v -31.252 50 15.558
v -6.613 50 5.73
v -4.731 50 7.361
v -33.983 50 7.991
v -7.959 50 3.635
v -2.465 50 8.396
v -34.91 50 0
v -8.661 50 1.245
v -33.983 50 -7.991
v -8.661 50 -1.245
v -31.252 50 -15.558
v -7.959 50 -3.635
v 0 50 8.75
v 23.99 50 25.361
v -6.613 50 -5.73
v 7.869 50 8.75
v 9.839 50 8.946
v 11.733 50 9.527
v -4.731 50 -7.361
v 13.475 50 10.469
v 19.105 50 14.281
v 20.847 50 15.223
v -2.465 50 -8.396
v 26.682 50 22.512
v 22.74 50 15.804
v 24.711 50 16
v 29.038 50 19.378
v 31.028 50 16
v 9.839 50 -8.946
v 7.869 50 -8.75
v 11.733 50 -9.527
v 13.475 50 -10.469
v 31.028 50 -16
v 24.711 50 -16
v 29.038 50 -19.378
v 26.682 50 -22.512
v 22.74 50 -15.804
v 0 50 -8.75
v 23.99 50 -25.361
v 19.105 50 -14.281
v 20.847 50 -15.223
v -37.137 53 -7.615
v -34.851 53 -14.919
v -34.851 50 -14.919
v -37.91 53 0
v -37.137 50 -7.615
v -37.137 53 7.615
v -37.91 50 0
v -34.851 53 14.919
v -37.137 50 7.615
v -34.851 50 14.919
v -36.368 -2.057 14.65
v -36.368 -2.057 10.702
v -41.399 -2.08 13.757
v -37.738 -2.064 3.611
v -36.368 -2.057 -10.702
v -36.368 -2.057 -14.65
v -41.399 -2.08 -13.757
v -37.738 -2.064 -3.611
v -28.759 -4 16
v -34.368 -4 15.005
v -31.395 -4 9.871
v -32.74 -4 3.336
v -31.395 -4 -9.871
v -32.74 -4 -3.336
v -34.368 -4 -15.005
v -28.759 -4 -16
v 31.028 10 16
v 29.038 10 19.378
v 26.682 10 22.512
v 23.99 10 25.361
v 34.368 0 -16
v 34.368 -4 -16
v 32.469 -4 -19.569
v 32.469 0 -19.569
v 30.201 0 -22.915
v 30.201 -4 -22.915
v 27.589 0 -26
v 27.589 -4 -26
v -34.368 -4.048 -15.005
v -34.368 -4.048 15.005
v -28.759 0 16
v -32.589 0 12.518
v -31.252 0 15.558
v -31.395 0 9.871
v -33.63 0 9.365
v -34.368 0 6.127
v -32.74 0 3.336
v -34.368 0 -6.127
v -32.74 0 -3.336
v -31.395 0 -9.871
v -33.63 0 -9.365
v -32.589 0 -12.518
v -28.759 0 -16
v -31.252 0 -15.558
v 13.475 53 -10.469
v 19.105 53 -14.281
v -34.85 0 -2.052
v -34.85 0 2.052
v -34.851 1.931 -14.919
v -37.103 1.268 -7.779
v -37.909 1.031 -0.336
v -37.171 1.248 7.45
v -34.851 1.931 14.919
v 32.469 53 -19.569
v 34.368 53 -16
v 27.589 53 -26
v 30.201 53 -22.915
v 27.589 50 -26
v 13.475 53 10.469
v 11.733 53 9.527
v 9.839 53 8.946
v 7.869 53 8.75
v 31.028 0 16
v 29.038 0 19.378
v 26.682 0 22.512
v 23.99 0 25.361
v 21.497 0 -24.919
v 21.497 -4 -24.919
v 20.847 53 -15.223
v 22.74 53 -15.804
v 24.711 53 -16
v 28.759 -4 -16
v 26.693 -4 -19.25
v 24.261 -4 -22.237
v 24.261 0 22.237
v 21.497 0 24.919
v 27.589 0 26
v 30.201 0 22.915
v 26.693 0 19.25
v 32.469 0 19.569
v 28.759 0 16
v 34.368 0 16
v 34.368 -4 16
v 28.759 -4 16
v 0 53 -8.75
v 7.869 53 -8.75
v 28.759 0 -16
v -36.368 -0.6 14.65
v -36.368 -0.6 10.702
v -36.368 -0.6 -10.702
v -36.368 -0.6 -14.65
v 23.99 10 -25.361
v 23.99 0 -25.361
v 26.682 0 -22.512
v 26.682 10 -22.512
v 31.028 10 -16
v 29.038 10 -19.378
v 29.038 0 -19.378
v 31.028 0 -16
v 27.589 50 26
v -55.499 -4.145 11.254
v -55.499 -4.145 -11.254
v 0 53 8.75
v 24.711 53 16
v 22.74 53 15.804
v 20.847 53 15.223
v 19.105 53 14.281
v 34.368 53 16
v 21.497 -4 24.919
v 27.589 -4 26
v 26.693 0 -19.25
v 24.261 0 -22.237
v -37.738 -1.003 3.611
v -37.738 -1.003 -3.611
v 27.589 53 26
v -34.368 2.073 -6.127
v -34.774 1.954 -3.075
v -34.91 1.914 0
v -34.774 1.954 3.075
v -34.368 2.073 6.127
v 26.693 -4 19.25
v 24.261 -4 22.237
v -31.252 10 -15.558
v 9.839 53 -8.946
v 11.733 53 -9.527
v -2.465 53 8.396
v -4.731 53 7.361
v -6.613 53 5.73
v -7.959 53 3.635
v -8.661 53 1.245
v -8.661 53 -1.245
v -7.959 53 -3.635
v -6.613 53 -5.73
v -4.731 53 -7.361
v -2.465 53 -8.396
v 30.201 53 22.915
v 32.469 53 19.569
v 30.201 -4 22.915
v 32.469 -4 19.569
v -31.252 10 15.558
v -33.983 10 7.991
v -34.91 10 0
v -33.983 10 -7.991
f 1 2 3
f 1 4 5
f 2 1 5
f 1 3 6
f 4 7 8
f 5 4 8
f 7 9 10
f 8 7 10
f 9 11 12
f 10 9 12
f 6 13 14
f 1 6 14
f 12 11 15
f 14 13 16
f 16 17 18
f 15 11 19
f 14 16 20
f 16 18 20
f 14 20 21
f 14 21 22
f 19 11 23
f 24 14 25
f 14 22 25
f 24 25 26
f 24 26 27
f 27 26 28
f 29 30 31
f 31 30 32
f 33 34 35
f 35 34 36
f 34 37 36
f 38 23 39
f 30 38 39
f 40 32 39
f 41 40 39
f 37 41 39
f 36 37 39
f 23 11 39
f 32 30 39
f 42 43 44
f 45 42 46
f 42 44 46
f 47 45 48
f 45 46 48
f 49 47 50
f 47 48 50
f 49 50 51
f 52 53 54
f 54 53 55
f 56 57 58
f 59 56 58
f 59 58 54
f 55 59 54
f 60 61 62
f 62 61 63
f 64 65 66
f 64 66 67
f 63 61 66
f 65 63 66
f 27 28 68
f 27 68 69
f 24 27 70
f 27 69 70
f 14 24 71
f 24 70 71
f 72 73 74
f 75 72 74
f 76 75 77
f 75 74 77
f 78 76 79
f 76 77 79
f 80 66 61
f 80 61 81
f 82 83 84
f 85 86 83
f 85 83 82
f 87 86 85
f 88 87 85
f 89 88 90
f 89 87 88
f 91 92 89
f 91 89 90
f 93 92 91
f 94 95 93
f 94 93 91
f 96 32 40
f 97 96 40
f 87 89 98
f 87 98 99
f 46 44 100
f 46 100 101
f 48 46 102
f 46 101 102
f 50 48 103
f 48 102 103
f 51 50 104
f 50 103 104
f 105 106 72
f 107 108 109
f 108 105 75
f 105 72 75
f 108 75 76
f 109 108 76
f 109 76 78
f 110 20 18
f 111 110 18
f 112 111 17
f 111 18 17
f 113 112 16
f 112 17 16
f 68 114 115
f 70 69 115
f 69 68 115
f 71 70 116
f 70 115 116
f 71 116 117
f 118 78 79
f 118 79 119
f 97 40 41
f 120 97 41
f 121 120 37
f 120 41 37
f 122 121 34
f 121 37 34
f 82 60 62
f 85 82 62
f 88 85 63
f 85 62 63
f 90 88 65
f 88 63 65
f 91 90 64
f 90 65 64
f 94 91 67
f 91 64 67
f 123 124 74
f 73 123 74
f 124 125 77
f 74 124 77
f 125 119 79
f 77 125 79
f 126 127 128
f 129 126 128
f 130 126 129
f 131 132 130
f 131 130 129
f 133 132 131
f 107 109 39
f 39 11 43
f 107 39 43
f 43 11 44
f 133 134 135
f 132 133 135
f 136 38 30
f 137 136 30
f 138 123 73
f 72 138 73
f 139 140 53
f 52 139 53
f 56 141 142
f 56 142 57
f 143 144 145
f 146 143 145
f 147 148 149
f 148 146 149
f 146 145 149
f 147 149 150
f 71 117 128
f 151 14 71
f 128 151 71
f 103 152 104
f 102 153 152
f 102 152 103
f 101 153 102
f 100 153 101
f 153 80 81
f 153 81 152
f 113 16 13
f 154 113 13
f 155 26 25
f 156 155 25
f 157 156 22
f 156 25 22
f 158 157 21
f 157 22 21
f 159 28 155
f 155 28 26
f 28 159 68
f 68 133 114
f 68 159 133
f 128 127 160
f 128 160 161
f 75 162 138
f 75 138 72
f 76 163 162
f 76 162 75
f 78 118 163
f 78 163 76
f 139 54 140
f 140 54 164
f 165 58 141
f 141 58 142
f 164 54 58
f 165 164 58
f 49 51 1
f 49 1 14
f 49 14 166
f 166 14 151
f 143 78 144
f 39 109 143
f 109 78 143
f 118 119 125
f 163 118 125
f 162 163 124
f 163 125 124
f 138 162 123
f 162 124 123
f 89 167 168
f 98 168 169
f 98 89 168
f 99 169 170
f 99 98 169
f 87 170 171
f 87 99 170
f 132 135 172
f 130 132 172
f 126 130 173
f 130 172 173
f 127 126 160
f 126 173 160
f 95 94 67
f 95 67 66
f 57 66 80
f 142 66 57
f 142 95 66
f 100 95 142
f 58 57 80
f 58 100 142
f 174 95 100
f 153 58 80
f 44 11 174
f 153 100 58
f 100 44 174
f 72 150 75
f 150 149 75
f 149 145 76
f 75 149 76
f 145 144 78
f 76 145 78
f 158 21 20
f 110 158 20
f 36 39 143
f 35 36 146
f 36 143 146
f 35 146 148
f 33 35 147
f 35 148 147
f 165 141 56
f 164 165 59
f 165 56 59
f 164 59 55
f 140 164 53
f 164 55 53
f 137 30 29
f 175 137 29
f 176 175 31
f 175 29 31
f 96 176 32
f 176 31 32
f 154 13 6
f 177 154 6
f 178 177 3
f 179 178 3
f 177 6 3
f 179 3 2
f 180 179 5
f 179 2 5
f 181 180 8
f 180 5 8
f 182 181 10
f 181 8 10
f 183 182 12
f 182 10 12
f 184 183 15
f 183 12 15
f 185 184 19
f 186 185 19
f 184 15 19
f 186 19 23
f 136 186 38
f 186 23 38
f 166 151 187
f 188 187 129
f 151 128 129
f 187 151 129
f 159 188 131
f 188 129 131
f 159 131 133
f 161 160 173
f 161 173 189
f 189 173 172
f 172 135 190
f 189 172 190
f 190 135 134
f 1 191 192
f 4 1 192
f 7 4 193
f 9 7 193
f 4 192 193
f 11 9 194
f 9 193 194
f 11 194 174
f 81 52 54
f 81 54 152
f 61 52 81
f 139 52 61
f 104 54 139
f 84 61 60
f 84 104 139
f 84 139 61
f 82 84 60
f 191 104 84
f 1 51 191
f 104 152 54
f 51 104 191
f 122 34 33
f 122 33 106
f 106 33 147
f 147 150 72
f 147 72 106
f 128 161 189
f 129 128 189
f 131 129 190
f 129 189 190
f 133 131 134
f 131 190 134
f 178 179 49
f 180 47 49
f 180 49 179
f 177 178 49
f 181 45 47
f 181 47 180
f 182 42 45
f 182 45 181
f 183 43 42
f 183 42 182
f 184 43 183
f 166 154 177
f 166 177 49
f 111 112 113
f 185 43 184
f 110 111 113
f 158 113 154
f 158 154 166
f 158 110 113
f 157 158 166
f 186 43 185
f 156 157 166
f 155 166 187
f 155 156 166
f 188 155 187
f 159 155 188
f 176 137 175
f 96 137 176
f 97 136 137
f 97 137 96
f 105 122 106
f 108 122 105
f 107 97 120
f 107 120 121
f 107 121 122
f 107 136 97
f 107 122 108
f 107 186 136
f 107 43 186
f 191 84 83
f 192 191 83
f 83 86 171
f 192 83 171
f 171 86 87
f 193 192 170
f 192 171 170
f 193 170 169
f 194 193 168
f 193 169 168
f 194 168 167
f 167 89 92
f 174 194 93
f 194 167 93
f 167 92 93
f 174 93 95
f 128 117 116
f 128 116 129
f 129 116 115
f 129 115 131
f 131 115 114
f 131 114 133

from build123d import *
from build123d.topology import SkipClean

# Parameters (mm, degrees)
BOSS_EXTRUDE1_DEPTH   = 50
BOSS_EXTRUDE1_2_DEPTH = 50
BOSS_EXTRUDE1_3_DEPTH = 50
BOSS_EXTRUDE2_START   = -4
BOSS_EXTRUDE2_DEPTH   = 4
BOSS_EXTRUDE3_START   = -32
BOSS_EXTRUDE3_DEPTH   = 32
CUT_EXTRUDE1_DEPTH    = 58
BOSS_EXTRUDE4_DEPTH   = 3
SKETCH6_R             = 34.91
CUT_EXTRUDE2_DEPTH    = 10


with BuildPart() as part:
    # Sketch1 → Boss-Extrude1 (new body)
    with BuildSketch(Plane(origin=(0, 0, 0), x_dir=(1, 0, 0), z_dir=(0, 1, 0))):
        with BuildLine():
            Line((-31.027537769, 16), (-34.368126222, 16))
            ThreePointArc((-34.368126222, 16), (-37.91, 0), (-34.368126222, -16))
            Line((-34.368126222, -16), (-31.027537769, -16))
            ThreePointArc((-31.027537769, -16), (-34.91, 0), (-31.027537769, 16))
        make_face()
    extrude(amount=BOSS_EXTRUDE1_DEPTH)

    # Sketch2 → Boss-Extrude2 (add)
    with BuildSketch(Plane(origin=(0, 0, 0), x_dir=(1, 0, 0), z_dir=(0, 1, 0)).offset(BOSS_EXTRUDE2_START)):
        with BuildLine():
            Line((28.758791699, 16), (34.368126222, 16))
            ThreePointArc((34.368126222, 16), (31.379609531, 21.271770158), (27.58927509, 26))
            Line((27.58927509, 26), (20.175928727, 26))
            ThreePointArc((20.175928727, 26), (24.973019757, 21.434000658), (28.758791699, 16))
        make_face()
        with BuildLine():
            ThreePointArc((-28.758791699, -16), (-32.91, 0), (-28.758791699, 16))
            Line((-28.758791699, 16), (-34.368126222, 16))
            ThreePointArc((-34.368126222, 16), (-37.91, 0), (-34.368126222, -16))
            Line((-34.368126222, -16), (-28.758791699, -16))
        make_face()
        with BuildLine():
            ThreePointArc((27.58927509, -26), (31.379609531, -21.271770158), (34.368126222, -16))
            Line((34.368126222, -16), (28.758791699, -16))
            ThreePointArc((28.758791699, -16), (24.973019757, -21.434000658), (20.175928727, -26))
            Line((20.175928727, -26), (27.58927509, -26))
        make_face()
    extrude(amount=BOSS_EXTRUDE2_DEPTH)


with BuildPart() as body_2:
    # Sketch1 → Boss-Extrude1 2 (new body)
    with BuildSketch(Plane(origin=(0, 0, 0), x_dir=(1, 0, 0), z_dir=(0, 1, 0))):
        with BuildLine():
            ThreePointArc((34.368126222, 16), (31.379609531, 21.271770158), (27.58927509, 26))
            Line((27.58927509, 26), (23.296096239, 26))
            ThreePointArc((23.296096239, 26), (27.618187902, 21.352840491), (31.027537769, 16))
            Line((31.027537769, 16), (34.368126222, 16))
        make_face()
    extrude(amount=BOSS_EXTRUDE1_2_DEPTH)


with BuildPart() as body_3:
    # Sketch1 → Boss-Extrude1 3 (new body)
    with BuildSketch(Plane(origin=(0, 0, 0), x_dir=(1, 0, 0), z_dir=(0, 1, 0))):
        with BuildLine():
            Line((23.296096239, -26), (27.58927509, -26))
            ThreePointArc((27.58927509, -26), (31.379609531, -21.271770158), (34.368126222, -16))
            Line((34.368126222, -16), (31.027537769, -16))
            ThreePointArc((31.027537769, -16), (27.618187902, -21.352840491), (23.296096239, -26))
        make_face()
    extrude(amount=BOSS_EXTRUDE1_3_DEPTH)


with BuildPart() as boss_extrude2_piece_1:
    # of the separate pieces the step leaves, piece 1, a body of its own (boss_extrude2_pieces)
    add(part.part.solids().sort_by_distance((-31.027537769, 0, 16))[0])

    # Sketch3 → Boss-Extrude3 (add)
    with BuildSketch(Plane.XY.offset(16).offset(BOSS_EXTRUDE3_START)):
        Polygon((-34.368126222, -4.048268878), (-55.498786824, -4.145046738), (-34.368126222, 2.073247191), align=None)
        Polygon((-36.368126222, -2.057407848), (-41.398520838, -2.080446921), (-36.368126222, -0.600111172), align=None, mode=Mode.SUBTRACT)
    extrude(amount=BOSS_EXTRUDE3_DEPTH)


with BuildPart() as boss_extrude2_piece_2:
    # of the separate pieces the step leaves, piece 2, a body of its own (boss_extrude2_pieces)
    add(part.part.solids().sort_by_distance((28.758791699, -4, -16))[0])


with BuildPart() as boss_extrude2_piece_3:
    # of the separate pieces the step leaves, piece 3, a body of its own (boss_extrude2_pieces)
    add(part.part.solids().sort_by_distance((28.758791699, -4, 16))[0])


with BuildPart() as cut_extrude1_tool:
    # Sketch4 → Cut-Extrude1 (new body)
    with BuildSketch(Plane(origin=(0, 50, 0), x_dir=(1, 0, 0), z_dir=(0, 1, 0))):
        Polygon((27.58927509, 26), (-55.498786824, 11.254496445), (-55.498786824, -11.254496445), (27.58927509, -26), (27.58927509, -30.815514941), (-65.642011764, -30.815514941), (-65.073155403, 32.733867097), (27.58927509, 31.904408001), align=None)
    extrude(amount=-CUT_EXTRUDE1_DEPTH)


with BuildPart() as body_2_1:
    add(body_2.part)

    # Cut-Extrude1: cut by cut_extrude1_tool
    add(cut_extrude1_tool.part, mode=Mode.SUBTRACT)



with BuildPart() as body_3_1:
    add(body_3.part)

    # Cut-Extrude1: cut by cut_extrude1_tool
    add(cut_extrude1_tool.part, mode=Mode.SUBTRACT)


with BuildPart() as boss_extrude2_piece_1_1:
    add(boss_extrude2_piece_1.part)

    # Cut-Extrude1: cut by cut_extrude1_tool
    add(cut_extrude1_tool.part, mode=Mode.SUBTRACT)


with BuildPart() as boss_extrude2_piece_2_1:
    add(boss_extrude2_piece_2.part)

    # Cut-Extrude1: cut by cut_extrude1_tool
    add(cut_extrude1_tool.part, mode=Mode.SUBTRACT)


with BuildPart() as boss_extrude2_piece_3_1:
    add(boss_extrude2_piece_3.part)

    # Cut-Extrude1: cut by cut_extrude1_tool
    add(cut_extrude1_tool.part, mode=Mode.SUBTRACT)


with BuildPart() as body_2_2:
    add(body_2_1.part)

    add(body_3_1.part)  # Boss-Extrude4 merges body 3

    add(boss_extrude2_piece_1_1.part)  # Boss-Extrude4 merges Boss-Extrude2 piece 1
    # Sketch5 → Boss-Extrude4 (add)
    with BuildSketch(Plane(origin=(0, 50, 0), x_dir=(1, 0, 0), z_dir=(0, 1, 0))):
        with BuildLine():
            Line((0, 8.75), (7.868608219, 8.75))
            ThreePointArc((7.868608219, 8.75), (10.800561485, 9.189474384), (13.474811079, 10.46926999))
            Line((13.474811079, 10.46926999), (19.104587981, 14.28073001))
            ThreePointArc((19.104587981, 14.28073001), (21.778837575, 15.560525616), (24.710790841, 16))
            Line((24.710790841, 16), (34.368126222, 16))
            ThreePointArc((34.368126222, 16), (31.379609531, 21.271770158), (27.58927509, 26))
            Line((27.58927509, 26), (-34.851070481, 14.918813168))
            ThreePointArc((-34.851070481, 14.918813168), (-37.91, 0), (-34.851070481, -14.918813168))
            Line((-34.851070481, -14.918813168), (27.58927509, -26))
            ThreePointArc((27.58927509, -26), (31.379609531, -21.271770158), (34.368126222, -16))
            Line((34.368126222, -16), (24.710790841, -16))
            ThreePointArc((24.710790841, -16), (21.778837575, -15.560525616), (19.104587981, -14.28073001))
            Line((19.104587981, -14.28073001), (13.474811079, -10.46926999))
            ThreePointArc((13.474811079, -10.46926999), (10.800561485, -9.189474384), (7.868608219, -8.75))
            Line((7.868608219, -8.75), (0, -8.75))
            ThreePointArc((0, -8.75), (-8.75, 0), (0, 8.75))
        make_face()
    extrude(amount=BOSS_EXTRUDE4_DEPTH)

    # Sketch6 → Cut-Extrude2 (cut)
    with SkipClean():  # the faces are left unmerged after this step: merging them gives an invalid solid
        with BuildSketch(Plane(origin=(0, 0, 0), x_dir=(1, 0, 0), z_dir=(0, 1, 0))):
            Circle(SKETCH6_R)
        extrude(amount=CUT_EXTRUDE2_DEPTH, mode=Mode.SUBTRACT)


solid = Compound([boss_extrude2_piece_2_1.part, boss_extrude2_piece_3_1.part, body_2_2.part])
